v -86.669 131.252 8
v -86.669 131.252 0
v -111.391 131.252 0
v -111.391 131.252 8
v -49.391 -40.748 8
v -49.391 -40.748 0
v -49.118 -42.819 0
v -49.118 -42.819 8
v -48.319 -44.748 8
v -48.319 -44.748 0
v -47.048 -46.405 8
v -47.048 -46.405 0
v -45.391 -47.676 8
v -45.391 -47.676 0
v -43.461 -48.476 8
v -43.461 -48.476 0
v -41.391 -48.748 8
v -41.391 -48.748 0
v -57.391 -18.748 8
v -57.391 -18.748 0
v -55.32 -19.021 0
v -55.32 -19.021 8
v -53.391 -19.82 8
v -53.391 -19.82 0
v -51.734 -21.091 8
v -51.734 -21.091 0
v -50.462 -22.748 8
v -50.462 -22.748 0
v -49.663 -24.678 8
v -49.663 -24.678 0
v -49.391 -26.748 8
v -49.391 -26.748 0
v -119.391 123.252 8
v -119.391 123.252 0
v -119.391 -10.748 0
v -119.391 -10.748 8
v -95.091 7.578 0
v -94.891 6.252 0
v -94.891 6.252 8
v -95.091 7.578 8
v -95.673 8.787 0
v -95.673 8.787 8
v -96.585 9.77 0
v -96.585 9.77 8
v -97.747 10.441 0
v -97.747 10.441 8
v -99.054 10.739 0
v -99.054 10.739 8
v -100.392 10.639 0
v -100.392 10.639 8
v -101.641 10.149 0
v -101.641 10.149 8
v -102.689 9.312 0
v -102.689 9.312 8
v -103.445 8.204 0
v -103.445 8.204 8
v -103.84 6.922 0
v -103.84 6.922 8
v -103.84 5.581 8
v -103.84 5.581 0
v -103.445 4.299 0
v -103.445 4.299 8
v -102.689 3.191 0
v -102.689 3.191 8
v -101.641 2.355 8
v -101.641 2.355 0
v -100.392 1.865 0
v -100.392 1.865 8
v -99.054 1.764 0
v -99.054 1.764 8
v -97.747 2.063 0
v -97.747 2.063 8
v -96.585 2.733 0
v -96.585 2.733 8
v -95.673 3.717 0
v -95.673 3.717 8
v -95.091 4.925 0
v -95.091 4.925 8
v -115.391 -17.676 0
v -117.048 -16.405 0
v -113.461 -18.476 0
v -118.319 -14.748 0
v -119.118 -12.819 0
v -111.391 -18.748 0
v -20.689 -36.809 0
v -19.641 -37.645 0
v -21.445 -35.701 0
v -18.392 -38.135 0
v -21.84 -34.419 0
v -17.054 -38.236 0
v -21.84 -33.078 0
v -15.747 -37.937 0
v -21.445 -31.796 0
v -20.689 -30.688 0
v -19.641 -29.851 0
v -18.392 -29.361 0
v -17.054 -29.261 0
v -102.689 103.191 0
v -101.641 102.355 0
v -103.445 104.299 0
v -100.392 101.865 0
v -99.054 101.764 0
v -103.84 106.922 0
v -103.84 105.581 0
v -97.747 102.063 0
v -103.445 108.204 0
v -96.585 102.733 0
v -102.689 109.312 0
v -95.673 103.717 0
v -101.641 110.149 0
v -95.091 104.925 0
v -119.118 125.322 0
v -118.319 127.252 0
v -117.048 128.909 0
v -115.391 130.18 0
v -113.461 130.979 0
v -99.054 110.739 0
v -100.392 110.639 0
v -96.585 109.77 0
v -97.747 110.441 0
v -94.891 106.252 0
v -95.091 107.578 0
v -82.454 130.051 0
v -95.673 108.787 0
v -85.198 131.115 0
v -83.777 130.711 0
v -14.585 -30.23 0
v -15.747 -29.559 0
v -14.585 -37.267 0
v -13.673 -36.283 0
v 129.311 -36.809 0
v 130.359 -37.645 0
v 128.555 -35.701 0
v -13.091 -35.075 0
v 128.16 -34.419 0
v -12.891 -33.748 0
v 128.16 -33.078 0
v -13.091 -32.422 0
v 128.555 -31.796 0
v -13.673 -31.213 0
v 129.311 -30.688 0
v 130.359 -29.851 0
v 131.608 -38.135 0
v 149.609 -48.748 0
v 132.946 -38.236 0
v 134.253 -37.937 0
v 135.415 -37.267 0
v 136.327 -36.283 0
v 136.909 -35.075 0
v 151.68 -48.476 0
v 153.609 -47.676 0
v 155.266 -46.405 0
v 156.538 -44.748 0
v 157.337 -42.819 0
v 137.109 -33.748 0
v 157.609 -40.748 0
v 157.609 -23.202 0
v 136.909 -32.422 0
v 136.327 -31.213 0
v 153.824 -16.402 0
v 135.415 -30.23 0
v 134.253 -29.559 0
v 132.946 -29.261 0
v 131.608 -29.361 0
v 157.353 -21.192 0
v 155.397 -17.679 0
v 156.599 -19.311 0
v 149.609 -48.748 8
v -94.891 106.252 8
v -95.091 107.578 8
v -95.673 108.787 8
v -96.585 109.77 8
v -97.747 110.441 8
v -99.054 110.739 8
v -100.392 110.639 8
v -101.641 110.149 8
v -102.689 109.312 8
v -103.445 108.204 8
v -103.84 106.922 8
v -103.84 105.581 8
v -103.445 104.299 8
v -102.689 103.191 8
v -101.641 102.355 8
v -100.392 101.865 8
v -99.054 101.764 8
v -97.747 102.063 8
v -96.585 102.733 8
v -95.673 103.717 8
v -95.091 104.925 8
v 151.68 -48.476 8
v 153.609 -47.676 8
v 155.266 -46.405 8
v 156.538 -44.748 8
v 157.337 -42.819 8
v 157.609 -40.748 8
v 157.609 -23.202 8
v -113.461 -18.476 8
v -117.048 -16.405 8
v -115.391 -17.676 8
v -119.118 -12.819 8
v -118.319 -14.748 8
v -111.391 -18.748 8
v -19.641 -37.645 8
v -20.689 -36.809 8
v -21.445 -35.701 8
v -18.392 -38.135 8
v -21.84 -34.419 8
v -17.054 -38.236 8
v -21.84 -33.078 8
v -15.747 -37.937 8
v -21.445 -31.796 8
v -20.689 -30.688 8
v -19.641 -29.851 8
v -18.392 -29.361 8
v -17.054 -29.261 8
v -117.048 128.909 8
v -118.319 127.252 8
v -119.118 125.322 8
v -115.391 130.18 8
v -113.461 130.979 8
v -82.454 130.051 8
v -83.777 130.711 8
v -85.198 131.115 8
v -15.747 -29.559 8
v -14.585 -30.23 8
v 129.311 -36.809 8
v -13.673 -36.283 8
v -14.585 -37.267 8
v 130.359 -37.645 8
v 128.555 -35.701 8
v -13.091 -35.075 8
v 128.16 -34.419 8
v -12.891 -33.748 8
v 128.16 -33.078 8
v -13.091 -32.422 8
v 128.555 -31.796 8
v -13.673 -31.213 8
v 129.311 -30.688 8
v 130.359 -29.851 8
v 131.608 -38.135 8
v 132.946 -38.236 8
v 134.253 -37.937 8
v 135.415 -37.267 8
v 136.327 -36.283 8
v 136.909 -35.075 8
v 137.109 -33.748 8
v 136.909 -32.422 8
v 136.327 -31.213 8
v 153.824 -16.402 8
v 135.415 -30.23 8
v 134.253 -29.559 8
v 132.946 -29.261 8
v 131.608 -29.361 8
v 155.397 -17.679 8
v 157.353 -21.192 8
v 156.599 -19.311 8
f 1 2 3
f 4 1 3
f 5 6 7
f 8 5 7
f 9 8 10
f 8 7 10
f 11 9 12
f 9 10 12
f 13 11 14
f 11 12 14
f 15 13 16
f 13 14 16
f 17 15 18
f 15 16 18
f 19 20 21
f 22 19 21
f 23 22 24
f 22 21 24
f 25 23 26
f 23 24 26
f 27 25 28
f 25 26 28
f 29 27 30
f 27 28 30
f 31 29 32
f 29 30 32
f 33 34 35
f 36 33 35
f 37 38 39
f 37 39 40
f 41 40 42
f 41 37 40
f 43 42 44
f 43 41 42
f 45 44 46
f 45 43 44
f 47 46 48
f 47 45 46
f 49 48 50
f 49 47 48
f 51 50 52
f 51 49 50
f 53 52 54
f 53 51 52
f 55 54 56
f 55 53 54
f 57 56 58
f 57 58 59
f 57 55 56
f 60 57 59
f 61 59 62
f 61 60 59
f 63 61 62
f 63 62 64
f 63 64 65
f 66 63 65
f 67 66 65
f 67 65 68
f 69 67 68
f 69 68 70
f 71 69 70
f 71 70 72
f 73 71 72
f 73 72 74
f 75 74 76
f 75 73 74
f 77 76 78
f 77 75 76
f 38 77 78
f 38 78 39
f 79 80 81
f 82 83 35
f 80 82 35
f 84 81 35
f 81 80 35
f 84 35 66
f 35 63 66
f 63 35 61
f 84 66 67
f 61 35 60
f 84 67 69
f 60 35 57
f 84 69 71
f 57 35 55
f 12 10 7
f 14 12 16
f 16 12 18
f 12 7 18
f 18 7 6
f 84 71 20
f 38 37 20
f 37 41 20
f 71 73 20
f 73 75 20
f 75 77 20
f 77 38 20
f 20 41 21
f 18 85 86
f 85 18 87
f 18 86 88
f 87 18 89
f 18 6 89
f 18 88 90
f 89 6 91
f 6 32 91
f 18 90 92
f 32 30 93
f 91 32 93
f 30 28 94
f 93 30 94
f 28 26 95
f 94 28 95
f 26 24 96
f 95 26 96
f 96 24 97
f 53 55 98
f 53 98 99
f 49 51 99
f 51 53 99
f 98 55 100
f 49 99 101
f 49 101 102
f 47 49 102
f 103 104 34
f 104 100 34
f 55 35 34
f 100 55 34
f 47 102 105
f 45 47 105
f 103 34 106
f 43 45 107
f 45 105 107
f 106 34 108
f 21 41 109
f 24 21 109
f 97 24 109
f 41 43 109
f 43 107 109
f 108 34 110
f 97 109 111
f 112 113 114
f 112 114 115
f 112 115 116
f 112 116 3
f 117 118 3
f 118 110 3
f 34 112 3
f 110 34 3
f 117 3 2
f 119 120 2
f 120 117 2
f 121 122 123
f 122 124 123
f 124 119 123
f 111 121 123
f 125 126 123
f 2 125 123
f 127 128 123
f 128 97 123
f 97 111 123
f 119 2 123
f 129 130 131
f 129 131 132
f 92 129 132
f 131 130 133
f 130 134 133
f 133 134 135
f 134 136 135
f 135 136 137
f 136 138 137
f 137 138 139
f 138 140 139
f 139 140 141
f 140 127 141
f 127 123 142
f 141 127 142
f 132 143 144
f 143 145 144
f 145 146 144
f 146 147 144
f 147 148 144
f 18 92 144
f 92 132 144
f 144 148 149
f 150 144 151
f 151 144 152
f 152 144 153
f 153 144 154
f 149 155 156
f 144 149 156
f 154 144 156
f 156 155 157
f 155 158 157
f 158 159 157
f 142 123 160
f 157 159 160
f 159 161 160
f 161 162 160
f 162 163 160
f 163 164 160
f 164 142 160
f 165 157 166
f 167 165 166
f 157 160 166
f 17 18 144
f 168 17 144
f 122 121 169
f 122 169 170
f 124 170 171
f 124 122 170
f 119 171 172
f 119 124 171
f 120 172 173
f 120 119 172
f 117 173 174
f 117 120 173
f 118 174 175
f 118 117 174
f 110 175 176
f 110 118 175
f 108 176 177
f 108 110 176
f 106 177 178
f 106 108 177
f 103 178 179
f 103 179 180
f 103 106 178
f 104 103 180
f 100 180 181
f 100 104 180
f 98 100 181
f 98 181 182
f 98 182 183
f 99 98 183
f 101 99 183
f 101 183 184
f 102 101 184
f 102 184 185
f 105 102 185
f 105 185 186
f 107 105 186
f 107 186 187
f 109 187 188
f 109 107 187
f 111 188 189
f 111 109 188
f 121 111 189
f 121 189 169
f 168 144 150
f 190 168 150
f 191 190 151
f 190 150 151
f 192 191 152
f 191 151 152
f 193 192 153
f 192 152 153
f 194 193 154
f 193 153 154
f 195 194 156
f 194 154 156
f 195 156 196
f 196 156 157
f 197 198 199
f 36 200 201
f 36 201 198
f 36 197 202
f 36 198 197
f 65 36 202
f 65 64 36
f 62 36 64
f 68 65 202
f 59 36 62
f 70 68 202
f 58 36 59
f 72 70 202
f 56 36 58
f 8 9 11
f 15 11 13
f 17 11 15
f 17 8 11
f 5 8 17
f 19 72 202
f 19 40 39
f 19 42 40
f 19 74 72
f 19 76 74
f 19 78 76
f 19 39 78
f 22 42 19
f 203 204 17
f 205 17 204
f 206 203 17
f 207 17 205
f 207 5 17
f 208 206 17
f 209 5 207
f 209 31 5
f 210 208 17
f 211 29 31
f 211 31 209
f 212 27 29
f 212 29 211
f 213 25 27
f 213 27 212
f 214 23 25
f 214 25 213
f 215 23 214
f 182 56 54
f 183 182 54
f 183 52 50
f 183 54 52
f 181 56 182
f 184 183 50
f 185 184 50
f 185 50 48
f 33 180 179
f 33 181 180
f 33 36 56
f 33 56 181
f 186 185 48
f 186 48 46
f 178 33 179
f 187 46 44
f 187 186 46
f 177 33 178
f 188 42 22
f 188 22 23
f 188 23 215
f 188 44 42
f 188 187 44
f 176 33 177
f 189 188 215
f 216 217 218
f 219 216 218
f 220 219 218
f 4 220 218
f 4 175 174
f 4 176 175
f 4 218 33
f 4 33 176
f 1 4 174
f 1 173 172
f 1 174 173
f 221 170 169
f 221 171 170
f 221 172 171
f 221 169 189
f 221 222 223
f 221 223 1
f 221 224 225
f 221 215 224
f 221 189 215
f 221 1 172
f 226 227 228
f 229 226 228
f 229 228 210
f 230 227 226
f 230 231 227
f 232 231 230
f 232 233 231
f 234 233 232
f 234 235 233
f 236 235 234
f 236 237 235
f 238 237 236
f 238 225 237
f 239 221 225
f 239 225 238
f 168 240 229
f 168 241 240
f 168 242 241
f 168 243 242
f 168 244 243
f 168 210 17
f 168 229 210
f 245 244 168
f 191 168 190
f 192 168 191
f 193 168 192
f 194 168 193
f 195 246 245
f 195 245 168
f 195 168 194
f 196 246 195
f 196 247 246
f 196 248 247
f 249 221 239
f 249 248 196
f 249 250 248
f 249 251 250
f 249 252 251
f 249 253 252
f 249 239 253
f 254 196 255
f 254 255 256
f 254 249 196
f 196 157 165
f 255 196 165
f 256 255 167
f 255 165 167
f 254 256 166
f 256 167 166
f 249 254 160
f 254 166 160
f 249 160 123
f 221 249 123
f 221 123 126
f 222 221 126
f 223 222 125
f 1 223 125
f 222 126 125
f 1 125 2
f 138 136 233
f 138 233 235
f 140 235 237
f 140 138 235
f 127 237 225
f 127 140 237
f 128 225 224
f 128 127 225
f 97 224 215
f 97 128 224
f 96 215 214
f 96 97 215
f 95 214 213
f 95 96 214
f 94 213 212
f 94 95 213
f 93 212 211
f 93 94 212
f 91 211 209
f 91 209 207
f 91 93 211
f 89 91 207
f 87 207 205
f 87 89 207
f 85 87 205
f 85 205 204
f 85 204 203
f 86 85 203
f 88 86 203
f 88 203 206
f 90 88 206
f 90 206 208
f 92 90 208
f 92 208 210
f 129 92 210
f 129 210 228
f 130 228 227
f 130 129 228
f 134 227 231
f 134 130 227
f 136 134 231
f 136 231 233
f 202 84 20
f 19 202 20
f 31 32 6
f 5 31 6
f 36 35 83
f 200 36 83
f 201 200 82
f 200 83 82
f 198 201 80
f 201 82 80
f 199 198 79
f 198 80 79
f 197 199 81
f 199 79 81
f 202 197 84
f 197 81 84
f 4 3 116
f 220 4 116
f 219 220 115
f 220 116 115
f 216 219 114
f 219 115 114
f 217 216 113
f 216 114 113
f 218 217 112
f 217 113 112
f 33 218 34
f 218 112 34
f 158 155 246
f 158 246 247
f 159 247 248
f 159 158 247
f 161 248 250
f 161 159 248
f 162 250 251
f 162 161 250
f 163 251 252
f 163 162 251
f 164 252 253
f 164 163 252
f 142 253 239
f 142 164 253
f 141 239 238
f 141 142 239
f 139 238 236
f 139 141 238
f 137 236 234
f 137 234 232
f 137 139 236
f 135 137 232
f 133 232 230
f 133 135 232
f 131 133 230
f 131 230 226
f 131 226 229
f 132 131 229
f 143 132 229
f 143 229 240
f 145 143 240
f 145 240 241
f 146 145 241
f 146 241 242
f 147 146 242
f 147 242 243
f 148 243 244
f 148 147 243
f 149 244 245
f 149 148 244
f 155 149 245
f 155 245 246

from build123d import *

# Parameters (mm, degrees)
SKETCH1_R           = 4.5
BOSS_EXTRUDE1_DEPTH = 8


with BuildPart() as part:
    # Sketch1 → Boss-Extrude1 (new body)
    with BuildSketch(Plane.XY):
        with BuildLine():
            Line((-119.390660592, 123.251708428), (-119.390660592, -10.748291572))
            ThreePointArc((-119.390660592, -10.748291572), (-117.047514842, -16.405145821), (-111.390660592, -18.748291572))
            Line((-111.390660592, -18.748291572), (-57.390660592, -18.748291572))
            ThreePointArc((-57.390660592, -18.748291572), (-51.733806343, -21.091437322), (-49.390660592, -26.748291572))
            Line((-49.390660592, -26.748291572), (-49.390660592, -40.748291572))
            ThreePointArc((-49.390660592, -40.748291572), (-47.047514842, -46.405145821), (-41.390660592, -48.748291572))
            Line((-41.390660592, -48.748291572), (149.609339408, -48.748291572))
            ThreePointArc((149.609339408, -48.748291572), (155.266193657, -46.405145821), (157.609339408, -40.748291572))
            Line((157.609339408, -40.748291572), (157.609339408, -23.201759464))
            ThreePointArc((157.609339408, -23.201759464), (156.599247983, -19.310592788), (153.824044881, -16.402034634))
            Line((153.824044881, -16.402034634), (-82.454216652, 130.051433259))
            ThreePointArc((-82.454216652, 130.051433259), (-84.477780716, 130.945790526), (-86.668922126, 131.251708428))
            Line((-86.668922126, 131.251708428), (-111.390660592, 131.251708428))
            ThreePointArc((-111.390660592, 131.251708428), (-117.047514842, 128.908562678), (-119.390660592, 123.251708428))
        make_face()
        with Locations((-99.390660592, 106.251708428)):
            Circle(SKETCH1_R, mode=Mode.SUBTRACT)
        with Locations((-99.390660592, 6.251708428)):
            Circle(SKETCH1_R, mode=Mode.SUBTRACT)
        with Locations((-17.390660592, -33.748291572)):
            Circle(SKETCH1_R, mode=Mode.SUBTRACT)
        with Locations((132.609339408, -33.748291572)):
            Circle(SKETCH1_R, mode=Mode.SUBTRACT)
    extrude(amount=BOSS_EXTRUDE1_DEPTH)


solid = part.part
